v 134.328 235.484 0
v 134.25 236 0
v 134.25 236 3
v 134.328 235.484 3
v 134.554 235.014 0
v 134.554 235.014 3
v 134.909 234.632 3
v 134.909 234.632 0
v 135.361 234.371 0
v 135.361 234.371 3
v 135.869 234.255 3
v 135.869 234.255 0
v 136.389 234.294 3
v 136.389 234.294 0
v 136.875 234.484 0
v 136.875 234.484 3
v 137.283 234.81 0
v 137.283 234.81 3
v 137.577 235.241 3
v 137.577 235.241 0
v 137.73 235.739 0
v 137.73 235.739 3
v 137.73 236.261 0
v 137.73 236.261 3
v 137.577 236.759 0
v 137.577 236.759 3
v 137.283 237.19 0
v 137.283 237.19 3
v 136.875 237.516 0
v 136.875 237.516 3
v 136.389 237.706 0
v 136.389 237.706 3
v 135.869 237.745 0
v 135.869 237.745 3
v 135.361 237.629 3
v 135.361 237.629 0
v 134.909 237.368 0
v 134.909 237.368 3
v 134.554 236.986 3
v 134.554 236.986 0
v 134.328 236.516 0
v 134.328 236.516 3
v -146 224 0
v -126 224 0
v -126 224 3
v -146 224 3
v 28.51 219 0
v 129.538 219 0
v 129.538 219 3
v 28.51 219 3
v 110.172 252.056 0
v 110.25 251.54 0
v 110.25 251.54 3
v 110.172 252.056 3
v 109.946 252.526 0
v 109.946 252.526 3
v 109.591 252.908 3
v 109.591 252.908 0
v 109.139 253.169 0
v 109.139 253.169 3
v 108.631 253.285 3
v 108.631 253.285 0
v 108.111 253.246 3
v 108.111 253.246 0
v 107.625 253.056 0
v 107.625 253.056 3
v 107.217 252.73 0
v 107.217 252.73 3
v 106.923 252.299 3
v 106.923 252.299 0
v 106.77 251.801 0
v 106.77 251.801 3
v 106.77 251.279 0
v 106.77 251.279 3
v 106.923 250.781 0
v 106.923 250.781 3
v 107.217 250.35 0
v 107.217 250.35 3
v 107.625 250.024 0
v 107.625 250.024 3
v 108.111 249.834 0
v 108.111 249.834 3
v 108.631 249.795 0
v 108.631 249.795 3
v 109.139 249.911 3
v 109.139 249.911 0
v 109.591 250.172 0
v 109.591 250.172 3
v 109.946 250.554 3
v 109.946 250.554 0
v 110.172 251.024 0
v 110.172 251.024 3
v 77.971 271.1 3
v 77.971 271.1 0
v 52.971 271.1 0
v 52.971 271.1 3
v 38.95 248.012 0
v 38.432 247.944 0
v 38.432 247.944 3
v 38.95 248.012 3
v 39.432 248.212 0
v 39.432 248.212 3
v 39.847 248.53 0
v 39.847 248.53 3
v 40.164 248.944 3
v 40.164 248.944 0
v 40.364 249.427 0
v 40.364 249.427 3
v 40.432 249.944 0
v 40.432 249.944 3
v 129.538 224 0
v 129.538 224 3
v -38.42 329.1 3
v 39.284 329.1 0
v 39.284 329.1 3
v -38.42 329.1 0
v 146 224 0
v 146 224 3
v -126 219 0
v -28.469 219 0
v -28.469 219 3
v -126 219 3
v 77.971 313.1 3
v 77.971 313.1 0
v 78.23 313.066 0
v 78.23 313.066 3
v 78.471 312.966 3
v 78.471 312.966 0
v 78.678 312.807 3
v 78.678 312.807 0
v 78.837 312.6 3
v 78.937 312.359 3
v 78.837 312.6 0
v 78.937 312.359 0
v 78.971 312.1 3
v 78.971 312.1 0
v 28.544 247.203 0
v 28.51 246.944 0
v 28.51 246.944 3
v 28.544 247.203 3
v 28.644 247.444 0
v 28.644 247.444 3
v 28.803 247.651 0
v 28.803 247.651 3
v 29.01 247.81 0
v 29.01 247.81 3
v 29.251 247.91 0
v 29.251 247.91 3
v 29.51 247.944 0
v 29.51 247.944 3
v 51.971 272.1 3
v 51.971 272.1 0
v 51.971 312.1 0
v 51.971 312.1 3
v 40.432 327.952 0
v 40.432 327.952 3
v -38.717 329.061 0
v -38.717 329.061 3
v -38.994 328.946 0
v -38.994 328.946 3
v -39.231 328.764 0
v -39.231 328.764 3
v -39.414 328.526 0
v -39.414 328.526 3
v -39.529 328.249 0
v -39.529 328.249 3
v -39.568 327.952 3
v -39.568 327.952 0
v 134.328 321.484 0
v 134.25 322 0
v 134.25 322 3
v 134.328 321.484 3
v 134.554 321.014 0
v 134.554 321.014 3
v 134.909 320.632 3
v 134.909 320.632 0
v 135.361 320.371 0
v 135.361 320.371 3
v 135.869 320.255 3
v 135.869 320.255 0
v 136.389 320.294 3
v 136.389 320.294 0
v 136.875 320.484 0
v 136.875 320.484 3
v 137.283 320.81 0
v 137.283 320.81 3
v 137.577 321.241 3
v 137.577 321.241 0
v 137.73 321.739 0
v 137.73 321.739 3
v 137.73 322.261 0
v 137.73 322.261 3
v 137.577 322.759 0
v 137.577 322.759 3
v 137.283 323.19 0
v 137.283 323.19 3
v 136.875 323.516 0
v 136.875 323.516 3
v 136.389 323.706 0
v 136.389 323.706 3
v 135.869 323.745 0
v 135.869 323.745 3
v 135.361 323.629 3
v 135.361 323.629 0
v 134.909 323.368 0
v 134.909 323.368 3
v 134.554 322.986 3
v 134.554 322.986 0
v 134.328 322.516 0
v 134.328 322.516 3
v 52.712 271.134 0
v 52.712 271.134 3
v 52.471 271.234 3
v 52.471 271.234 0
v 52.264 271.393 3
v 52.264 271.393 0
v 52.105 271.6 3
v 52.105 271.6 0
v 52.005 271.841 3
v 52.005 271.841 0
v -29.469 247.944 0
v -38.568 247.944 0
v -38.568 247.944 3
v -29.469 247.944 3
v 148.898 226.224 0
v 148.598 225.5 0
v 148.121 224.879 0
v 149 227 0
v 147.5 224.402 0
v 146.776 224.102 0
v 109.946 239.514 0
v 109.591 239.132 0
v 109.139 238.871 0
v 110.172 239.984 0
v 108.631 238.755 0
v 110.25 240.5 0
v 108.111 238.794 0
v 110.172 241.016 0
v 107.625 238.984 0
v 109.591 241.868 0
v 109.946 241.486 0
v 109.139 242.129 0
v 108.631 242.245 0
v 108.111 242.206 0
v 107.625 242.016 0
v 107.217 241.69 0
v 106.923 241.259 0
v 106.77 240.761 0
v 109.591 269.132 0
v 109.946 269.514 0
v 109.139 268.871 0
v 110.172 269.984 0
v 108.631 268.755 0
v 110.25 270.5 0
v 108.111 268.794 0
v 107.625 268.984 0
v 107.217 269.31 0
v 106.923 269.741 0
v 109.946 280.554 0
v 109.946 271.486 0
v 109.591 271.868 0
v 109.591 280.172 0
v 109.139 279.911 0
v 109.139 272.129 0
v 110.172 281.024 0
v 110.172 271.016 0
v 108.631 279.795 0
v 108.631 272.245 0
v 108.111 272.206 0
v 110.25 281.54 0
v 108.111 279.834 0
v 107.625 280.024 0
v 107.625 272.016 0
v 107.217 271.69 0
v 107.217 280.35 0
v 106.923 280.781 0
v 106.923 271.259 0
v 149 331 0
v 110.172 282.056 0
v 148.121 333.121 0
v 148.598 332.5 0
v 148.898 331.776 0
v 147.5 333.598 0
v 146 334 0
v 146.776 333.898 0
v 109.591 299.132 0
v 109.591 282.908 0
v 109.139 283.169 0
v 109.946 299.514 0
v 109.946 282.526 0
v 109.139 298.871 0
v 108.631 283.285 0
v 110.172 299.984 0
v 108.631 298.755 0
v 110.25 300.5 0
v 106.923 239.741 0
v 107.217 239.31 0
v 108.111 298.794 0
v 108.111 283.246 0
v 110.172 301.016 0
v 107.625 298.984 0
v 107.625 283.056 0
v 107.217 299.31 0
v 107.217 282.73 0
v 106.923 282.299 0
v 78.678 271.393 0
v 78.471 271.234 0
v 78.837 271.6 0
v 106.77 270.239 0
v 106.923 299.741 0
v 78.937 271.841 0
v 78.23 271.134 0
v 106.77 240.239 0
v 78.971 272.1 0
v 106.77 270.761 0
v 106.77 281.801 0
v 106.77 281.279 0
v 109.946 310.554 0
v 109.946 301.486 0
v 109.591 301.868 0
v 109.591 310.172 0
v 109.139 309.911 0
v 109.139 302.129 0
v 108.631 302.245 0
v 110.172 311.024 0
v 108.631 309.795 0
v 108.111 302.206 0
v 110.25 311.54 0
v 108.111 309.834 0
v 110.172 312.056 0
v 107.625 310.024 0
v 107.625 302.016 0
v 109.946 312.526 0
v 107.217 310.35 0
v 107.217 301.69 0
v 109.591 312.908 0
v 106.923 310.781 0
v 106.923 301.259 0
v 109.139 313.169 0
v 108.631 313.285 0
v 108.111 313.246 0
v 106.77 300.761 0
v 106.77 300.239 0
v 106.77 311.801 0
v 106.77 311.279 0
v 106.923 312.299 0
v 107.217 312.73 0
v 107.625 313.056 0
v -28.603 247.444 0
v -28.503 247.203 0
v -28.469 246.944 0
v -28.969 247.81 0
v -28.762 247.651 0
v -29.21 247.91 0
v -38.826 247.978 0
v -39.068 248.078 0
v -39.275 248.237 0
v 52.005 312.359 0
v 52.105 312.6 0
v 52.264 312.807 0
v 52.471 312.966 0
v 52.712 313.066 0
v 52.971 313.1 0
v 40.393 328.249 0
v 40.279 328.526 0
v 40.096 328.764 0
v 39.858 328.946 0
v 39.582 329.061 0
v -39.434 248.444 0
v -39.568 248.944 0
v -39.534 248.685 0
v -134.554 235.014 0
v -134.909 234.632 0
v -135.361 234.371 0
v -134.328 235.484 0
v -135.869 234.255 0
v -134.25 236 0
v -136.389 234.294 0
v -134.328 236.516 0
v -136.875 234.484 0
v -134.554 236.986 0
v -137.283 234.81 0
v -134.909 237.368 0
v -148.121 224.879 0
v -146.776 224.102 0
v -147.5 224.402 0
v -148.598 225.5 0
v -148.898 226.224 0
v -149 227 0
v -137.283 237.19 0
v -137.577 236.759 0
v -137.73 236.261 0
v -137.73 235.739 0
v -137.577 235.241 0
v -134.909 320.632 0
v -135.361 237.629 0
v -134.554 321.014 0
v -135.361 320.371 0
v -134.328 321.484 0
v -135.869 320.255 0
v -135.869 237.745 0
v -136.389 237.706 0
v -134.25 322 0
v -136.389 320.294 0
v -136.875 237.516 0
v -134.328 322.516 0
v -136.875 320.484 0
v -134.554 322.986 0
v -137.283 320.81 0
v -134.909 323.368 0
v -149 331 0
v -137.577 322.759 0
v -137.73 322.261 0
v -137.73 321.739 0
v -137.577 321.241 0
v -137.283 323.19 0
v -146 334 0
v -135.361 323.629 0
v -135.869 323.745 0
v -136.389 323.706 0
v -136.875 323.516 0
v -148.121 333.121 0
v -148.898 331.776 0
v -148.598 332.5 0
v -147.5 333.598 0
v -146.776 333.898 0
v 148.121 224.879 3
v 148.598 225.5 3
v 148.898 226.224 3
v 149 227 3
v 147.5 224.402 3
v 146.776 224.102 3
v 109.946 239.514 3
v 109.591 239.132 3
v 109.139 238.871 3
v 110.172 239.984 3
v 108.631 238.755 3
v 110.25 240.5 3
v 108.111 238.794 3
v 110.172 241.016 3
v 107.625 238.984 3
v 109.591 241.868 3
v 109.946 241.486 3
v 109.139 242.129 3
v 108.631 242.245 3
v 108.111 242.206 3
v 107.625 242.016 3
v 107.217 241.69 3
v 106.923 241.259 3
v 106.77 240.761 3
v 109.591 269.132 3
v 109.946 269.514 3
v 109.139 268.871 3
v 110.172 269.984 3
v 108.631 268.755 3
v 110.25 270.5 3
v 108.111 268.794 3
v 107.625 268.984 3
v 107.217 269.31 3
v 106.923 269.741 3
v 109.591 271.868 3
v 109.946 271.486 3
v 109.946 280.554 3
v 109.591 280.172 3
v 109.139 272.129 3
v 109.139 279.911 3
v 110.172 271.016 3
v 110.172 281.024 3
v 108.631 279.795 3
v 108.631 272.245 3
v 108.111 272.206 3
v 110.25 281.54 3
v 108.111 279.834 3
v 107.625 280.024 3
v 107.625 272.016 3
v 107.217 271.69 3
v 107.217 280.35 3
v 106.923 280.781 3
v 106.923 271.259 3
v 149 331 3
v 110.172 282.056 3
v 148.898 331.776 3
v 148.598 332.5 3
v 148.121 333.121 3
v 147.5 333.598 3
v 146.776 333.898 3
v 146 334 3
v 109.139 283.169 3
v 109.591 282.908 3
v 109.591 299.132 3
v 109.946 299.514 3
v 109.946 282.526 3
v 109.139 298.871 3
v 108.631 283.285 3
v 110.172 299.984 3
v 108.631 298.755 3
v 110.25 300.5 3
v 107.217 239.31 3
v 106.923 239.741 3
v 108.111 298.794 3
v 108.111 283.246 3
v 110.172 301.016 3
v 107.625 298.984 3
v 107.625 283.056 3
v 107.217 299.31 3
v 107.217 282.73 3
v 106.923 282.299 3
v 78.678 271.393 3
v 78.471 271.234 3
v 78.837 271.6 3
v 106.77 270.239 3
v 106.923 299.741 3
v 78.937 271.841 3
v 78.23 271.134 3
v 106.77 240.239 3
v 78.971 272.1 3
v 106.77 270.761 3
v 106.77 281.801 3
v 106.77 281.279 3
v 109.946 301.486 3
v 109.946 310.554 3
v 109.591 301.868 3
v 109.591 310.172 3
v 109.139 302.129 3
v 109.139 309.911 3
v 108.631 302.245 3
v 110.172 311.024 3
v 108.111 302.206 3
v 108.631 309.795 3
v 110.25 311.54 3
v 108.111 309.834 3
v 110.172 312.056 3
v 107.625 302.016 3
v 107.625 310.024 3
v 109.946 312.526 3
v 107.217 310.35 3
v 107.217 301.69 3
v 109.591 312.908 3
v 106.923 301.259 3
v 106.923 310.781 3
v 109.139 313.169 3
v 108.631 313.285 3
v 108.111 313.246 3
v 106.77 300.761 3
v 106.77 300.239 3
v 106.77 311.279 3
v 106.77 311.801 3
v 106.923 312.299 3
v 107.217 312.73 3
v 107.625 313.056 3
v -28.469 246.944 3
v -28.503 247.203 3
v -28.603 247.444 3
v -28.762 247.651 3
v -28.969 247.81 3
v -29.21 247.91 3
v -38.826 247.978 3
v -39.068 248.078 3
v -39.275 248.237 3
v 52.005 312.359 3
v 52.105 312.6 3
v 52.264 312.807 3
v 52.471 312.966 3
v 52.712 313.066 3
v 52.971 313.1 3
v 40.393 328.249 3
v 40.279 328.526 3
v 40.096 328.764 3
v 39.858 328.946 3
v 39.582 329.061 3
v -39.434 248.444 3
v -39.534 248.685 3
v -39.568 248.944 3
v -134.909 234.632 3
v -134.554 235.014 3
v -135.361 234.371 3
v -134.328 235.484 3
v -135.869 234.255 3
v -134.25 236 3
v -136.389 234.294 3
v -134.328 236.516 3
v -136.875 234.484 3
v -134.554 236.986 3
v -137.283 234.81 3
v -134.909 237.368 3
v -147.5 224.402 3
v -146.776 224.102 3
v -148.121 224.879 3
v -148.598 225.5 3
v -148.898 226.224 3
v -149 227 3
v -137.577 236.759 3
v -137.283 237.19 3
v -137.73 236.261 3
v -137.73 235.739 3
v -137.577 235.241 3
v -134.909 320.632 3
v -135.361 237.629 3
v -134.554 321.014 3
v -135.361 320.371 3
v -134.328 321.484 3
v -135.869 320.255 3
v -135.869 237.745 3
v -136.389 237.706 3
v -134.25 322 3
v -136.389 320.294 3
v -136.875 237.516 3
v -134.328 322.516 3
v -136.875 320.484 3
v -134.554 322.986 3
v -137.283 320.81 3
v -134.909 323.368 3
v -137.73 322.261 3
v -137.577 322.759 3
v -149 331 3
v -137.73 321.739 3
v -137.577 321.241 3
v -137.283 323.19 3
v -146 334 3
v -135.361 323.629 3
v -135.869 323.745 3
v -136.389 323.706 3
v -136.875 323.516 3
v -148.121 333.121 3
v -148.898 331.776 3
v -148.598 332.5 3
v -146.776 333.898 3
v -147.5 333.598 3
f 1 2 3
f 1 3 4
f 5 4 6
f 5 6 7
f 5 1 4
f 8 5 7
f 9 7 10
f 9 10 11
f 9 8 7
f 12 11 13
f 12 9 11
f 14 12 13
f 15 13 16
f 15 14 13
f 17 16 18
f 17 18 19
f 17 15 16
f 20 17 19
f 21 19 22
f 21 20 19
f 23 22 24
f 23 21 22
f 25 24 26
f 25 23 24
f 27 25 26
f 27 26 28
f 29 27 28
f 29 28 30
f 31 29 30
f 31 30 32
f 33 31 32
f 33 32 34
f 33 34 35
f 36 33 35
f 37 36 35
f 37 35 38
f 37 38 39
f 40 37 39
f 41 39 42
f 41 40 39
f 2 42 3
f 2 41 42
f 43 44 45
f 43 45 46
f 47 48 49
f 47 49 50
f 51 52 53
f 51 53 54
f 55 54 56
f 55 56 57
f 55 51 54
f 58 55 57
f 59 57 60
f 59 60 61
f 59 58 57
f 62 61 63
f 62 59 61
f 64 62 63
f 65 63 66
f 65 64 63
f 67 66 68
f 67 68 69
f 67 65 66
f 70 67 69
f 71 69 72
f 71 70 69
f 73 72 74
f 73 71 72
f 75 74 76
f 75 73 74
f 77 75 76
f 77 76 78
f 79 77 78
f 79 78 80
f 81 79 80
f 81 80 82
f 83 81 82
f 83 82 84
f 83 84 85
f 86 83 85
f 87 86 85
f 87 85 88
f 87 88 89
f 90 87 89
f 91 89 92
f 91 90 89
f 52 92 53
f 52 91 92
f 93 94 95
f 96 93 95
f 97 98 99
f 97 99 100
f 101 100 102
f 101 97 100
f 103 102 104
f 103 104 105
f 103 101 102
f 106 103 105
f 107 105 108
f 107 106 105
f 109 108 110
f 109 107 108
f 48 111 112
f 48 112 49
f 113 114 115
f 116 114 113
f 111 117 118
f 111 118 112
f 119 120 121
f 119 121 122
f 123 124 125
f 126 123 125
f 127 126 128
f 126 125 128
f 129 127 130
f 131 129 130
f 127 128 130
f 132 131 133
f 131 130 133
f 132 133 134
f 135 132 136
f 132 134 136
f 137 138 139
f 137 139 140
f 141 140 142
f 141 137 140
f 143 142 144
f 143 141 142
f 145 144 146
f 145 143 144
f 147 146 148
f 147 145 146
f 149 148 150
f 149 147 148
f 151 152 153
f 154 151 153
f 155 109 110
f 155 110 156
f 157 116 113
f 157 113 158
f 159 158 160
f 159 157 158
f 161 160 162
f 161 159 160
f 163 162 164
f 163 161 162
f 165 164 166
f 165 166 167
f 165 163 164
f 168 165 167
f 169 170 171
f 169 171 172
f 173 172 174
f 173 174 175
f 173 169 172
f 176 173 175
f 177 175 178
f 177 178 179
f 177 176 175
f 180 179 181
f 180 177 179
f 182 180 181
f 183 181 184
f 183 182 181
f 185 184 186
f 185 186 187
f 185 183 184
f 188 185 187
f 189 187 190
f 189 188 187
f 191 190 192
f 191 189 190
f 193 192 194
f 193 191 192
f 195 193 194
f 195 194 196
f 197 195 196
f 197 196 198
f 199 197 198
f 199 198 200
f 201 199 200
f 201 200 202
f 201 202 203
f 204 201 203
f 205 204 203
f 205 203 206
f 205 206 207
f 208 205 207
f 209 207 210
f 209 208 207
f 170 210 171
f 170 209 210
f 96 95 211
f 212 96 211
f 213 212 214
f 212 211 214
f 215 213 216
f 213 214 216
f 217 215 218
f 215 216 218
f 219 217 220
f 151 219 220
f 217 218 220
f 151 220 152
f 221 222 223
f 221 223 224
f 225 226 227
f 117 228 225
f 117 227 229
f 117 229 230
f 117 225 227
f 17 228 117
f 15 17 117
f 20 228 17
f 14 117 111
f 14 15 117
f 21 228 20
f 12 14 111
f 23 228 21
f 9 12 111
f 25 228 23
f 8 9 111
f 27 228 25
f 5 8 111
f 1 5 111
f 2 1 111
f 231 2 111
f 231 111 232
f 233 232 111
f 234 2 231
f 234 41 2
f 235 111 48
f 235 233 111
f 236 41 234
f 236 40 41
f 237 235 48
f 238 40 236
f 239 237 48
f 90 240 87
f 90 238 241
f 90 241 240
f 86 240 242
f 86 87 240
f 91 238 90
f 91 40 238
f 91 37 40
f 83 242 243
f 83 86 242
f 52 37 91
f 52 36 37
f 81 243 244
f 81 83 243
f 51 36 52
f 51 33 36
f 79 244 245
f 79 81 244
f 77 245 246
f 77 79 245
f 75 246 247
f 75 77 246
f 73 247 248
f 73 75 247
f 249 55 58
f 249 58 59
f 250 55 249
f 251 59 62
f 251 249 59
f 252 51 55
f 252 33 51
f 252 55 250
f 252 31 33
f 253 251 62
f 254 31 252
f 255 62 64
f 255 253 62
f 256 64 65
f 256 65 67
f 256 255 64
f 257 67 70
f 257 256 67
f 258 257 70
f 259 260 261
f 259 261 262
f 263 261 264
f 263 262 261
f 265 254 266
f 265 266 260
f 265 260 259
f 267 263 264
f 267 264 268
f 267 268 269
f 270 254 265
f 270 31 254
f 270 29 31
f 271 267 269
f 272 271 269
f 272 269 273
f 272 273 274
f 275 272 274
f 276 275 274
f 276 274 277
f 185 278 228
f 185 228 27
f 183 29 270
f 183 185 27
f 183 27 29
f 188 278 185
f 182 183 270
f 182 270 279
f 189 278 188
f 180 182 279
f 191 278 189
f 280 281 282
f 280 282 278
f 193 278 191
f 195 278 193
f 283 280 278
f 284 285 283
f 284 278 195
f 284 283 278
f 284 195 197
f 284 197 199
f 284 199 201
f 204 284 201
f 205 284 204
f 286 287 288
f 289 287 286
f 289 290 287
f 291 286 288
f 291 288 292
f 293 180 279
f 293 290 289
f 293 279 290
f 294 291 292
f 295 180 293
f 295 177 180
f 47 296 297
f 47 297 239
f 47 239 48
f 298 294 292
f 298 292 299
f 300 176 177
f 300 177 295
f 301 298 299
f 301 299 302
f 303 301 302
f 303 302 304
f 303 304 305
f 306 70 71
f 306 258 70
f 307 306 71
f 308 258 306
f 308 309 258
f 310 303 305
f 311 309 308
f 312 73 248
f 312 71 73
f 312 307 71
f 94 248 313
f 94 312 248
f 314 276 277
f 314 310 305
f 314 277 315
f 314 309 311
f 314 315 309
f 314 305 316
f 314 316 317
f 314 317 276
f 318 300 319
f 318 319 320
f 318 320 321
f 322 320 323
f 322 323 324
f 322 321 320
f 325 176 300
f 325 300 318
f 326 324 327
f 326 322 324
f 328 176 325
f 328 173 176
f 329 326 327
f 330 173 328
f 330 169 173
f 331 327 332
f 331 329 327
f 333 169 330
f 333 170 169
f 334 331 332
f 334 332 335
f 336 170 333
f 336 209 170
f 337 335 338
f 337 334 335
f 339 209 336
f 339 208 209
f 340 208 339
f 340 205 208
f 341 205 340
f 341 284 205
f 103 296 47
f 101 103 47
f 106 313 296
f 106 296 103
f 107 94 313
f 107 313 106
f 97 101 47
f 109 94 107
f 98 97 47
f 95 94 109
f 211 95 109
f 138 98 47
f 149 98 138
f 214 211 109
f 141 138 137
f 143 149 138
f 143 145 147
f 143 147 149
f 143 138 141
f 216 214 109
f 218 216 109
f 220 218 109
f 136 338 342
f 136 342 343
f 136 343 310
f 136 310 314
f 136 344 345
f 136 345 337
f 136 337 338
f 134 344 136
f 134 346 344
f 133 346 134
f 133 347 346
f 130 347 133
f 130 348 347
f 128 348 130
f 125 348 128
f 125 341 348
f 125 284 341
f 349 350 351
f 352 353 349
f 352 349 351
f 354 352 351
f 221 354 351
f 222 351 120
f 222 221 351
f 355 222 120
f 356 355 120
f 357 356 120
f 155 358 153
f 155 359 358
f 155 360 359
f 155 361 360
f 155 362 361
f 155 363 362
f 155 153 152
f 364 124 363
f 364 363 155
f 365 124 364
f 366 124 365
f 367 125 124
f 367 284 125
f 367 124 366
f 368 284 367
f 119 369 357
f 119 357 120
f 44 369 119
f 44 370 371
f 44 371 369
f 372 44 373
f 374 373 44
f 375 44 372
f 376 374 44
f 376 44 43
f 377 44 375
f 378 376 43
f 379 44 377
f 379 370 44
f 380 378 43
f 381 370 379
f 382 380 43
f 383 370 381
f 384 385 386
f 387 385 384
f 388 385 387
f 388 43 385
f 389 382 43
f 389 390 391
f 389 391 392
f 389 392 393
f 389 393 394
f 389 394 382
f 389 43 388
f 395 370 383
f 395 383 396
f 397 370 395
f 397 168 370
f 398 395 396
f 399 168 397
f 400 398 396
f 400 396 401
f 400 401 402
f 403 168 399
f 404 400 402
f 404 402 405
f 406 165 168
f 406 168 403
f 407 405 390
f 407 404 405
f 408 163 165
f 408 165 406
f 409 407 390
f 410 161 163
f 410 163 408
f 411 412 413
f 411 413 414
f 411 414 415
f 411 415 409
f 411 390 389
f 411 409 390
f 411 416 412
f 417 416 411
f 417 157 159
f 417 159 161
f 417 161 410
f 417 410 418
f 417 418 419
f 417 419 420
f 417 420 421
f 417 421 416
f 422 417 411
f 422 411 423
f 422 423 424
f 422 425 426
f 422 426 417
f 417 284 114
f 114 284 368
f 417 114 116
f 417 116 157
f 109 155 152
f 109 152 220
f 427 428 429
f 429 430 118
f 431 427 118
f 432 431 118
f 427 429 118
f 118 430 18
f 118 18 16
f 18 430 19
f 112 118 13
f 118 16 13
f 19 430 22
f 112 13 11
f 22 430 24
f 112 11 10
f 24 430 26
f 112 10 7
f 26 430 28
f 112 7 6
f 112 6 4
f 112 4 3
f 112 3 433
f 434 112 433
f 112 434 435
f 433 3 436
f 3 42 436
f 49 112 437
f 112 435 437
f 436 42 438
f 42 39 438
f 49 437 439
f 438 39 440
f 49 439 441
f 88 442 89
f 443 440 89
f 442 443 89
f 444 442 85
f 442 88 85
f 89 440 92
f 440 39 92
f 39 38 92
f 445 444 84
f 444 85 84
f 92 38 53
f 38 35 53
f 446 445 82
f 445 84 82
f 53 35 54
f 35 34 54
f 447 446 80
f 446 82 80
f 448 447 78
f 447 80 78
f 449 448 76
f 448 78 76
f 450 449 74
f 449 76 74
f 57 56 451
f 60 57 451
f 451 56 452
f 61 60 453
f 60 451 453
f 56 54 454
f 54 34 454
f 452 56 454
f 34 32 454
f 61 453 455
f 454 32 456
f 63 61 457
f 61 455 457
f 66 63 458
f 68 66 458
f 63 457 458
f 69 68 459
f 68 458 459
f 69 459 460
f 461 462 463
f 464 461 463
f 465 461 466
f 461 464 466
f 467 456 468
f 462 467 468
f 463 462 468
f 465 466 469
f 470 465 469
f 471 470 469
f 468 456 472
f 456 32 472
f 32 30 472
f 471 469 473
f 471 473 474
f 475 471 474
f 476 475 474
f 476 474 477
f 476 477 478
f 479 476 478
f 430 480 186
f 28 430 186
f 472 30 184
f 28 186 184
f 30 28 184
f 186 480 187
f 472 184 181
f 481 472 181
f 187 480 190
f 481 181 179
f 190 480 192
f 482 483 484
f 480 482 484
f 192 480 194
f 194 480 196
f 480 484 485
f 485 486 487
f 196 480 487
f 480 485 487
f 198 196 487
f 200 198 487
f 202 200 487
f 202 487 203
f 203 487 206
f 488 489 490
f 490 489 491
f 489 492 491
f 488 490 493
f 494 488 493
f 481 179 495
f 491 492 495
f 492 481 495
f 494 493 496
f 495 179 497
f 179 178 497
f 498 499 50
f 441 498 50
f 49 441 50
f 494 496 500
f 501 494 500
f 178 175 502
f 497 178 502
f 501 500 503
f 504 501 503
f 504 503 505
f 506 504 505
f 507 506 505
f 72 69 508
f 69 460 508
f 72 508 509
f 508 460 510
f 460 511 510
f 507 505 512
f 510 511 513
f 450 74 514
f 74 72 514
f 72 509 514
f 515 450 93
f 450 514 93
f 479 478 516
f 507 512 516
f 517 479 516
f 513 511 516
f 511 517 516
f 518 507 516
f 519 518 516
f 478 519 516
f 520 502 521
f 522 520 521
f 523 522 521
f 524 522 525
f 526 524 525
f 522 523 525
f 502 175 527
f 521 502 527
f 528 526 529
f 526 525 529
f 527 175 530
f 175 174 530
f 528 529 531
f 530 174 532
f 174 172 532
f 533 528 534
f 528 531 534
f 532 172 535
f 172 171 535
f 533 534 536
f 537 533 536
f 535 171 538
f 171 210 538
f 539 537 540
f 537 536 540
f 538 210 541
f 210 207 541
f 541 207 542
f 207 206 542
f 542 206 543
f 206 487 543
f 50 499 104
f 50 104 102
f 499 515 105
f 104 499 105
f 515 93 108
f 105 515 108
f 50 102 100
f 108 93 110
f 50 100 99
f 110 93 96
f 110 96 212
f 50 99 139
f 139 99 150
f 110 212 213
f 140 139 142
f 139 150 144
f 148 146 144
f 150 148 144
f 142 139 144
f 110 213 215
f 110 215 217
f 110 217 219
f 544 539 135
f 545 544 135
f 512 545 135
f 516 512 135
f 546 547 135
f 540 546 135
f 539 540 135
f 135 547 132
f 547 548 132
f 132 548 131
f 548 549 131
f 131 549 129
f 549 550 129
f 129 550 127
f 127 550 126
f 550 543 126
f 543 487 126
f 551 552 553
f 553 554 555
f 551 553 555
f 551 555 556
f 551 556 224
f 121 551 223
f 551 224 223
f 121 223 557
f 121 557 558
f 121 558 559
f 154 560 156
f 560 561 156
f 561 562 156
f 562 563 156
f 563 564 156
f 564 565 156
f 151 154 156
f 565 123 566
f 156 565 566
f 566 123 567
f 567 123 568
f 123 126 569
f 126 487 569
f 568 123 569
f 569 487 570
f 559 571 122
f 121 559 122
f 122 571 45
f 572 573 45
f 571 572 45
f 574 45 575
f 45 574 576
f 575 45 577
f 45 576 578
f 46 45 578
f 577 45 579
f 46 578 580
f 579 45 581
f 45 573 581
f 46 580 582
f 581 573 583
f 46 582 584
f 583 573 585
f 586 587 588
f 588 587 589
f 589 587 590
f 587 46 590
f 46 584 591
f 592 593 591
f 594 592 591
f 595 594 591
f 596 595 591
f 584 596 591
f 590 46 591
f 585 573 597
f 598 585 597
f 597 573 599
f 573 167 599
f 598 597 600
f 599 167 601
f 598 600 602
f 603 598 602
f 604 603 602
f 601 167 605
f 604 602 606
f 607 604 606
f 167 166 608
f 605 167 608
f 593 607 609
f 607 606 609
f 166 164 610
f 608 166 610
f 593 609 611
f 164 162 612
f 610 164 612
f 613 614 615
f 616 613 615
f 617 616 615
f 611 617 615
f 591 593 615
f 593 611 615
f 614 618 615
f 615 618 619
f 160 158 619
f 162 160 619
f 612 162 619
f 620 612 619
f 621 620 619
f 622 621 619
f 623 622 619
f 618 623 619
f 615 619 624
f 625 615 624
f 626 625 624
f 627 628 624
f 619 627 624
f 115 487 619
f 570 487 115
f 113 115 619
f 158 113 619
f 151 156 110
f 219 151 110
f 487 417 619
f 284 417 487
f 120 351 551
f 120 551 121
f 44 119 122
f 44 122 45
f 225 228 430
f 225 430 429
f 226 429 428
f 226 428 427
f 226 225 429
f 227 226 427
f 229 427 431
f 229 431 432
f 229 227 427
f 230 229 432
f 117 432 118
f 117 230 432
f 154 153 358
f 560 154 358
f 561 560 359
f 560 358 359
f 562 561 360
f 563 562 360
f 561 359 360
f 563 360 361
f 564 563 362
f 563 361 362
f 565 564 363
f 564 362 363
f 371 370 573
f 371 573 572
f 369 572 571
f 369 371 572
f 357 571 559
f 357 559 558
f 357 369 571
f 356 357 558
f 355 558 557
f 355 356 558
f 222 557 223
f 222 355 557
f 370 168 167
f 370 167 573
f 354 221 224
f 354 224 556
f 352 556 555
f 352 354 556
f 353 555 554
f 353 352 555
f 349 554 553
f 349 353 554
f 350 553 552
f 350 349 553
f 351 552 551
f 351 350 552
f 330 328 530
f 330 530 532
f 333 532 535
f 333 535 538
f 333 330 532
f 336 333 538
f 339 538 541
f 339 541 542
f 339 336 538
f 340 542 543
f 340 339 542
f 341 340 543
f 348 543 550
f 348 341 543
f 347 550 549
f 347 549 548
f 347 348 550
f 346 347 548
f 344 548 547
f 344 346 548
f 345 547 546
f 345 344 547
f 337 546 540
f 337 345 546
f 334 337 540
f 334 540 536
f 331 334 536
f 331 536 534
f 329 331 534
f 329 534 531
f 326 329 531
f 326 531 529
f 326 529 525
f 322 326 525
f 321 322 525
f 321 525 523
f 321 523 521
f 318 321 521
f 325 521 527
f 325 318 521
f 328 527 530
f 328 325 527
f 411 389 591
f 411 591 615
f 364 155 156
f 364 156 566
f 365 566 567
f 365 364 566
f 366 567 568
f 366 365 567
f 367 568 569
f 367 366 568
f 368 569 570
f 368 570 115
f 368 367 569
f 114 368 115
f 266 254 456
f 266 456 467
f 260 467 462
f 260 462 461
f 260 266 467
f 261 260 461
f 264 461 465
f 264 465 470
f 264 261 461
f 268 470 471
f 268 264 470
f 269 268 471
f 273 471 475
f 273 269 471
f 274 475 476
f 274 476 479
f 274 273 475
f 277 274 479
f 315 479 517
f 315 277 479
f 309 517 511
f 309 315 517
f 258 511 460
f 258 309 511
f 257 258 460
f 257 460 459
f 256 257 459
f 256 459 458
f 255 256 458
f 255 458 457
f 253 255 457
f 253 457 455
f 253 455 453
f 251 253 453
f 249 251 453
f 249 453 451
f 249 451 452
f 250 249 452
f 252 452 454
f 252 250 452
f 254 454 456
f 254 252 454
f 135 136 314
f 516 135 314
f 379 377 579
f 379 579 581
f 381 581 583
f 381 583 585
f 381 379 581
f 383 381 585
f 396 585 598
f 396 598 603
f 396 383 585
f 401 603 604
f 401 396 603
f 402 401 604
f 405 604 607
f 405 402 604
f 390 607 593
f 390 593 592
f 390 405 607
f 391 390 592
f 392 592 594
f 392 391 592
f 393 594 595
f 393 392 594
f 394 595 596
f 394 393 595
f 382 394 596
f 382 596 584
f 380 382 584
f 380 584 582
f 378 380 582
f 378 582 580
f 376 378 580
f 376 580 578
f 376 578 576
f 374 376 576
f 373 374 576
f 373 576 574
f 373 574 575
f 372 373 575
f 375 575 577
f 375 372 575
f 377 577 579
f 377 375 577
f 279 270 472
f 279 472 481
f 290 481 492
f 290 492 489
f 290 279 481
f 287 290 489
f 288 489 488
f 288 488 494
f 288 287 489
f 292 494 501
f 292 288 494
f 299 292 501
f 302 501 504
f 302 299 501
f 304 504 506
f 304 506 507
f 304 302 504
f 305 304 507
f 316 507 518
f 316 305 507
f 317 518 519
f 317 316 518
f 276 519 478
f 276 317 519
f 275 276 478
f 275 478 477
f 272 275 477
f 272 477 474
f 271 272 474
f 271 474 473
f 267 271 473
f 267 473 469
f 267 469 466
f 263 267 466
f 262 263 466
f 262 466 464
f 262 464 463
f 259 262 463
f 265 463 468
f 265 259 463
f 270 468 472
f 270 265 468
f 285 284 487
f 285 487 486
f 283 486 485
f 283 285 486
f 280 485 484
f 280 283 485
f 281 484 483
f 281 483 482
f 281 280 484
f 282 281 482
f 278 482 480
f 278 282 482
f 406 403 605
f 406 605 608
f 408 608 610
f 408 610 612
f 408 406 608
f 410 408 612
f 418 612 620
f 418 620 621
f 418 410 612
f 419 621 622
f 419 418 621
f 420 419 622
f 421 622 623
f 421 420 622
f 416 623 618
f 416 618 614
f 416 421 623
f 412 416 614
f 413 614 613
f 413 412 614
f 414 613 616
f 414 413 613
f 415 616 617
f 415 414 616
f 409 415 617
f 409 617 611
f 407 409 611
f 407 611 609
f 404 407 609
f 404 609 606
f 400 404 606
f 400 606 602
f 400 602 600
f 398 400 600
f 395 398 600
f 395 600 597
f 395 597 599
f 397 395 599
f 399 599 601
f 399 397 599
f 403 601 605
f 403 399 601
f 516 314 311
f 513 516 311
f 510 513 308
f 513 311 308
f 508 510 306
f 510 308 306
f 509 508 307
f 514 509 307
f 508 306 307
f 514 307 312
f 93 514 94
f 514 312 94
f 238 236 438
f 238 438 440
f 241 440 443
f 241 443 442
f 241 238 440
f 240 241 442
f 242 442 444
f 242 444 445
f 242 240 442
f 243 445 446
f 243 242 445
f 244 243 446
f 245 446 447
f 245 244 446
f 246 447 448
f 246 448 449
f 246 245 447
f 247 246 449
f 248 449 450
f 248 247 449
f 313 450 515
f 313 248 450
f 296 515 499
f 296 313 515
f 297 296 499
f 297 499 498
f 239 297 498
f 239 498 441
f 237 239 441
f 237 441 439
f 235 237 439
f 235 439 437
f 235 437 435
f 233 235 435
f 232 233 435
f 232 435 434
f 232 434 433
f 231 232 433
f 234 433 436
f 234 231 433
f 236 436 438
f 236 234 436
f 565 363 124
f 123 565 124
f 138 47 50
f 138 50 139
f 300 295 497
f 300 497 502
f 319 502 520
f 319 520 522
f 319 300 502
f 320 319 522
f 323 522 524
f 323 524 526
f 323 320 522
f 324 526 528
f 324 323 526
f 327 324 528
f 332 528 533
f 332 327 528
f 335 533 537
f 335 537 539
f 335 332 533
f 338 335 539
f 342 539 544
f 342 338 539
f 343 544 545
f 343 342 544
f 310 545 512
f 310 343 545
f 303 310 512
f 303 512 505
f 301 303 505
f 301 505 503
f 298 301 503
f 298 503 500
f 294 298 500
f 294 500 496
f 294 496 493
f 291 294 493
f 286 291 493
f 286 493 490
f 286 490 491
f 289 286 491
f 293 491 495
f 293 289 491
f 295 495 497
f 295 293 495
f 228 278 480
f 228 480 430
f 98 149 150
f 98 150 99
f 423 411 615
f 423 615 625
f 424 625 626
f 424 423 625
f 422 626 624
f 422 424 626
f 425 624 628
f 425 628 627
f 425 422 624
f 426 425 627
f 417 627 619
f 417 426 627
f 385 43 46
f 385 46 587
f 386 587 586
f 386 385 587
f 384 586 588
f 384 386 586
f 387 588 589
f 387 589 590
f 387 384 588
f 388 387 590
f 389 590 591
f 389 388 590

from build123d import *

# Parameters (mm, degrees)
SKETCH1_R           = 1.75
BOSS_EXTRUDE1_DEPTH = 3


with BuildPart() as part:
    # Sketch1 → Boss-Extrude1 (new body)
    with BuildSketch(Plane.XY):
        with BuildLine():
            Line((-146, 333.999999944), (146, 333.999999944))
            ThreePointArc((146, 333.999999944), (148.121320344, 333.121320287), (149, 330.999999944))
            Line((149, 330.999999944), (149, 226.999999944))
            ThreePointArc((149, 226.999999944), (148.121320344, 224.8786796), (146, 223.999999944))
            Line((146, 223.999999944), (129.53838912, 223.999999944))
            Line((129.53838912, 223.999999944), (129.53838912, 219))
            Line((129.53838912, 219), (73.53838912, 219))
            Line((73.53838912, 219), (28.510237275, 219))
            Line((28.510237275, 219), (28.510237275, 246.944274273))
            ThreePointArc((28.510237275, 246.944274273), (28.803130494, 247.651381054), (29.510237275, 247.944274273))
            Line((29.510237275, 247.944274273), (38.432325919, 247.944274273))
            ThreePointArc((38.432325919, 247.944274273), (39.846539481, 248.530060711), (40.432325919, 249.944274273))
            Line((40.432325919, 249.944274273), (40.432325919, 327.952168393))
            ThreePointArc((40.432325919, 327.952168393), (40.096133825, 328.763807906), (39.284494312, 329.1))
            Line((39.284494312, 329.1), (-38.419842474, 329.1))
            ThreePointArc((-38.419842474, 329.1), (-39.231481987, 328.763807906), (-39.567674081, 327.952168393))
            Line((-39.567674081, 327.952168393), (-39.567674081, 248.944274273))
            ThreePointArc((-39.567674081, 248.944274273), (-39.274780862, 248.237167492), (-38.567674081, 247.944274273))
            Line((-38.567674081, 247.944274273), (-29.469288178, 247.944274273))
            ThreePointArc((-29.469288178, 247.944274273), (-28.762181396, 247.651381054), (-28.469288178, 246.944274273))
            Line((-28.469288178, 246.944274273), (-28.469288178, 218.999999943))
            Line((-28.469288178, 218.999999943), (-70, 218.999999943))
            Line((-70, 218.999999943), (-126, 218.999999943))
            Line((-126, 218.999999943), (-126, 223.999999944))
            Line((-126, 223.999999944), (-146, 223.999999944))
            ThreePointArc((-146, 223.999999944), (-148.121320343, 224.8786796), (-149, 226.999999944))
            Line((-149, 226.999999944), (-149, 330.999999944))
            ThreePointArc((-149, 330.999999944), (-148.121320343, 333.121320287), (-146, 333.999999944))
        make_face()
        with Locations((-136, 321.999999944)):
            Circle(SKETCH1_R, mode=Mode.SUBTRACT)
        with Locations((-136, 235.999999944)):
            Circle(SKETCH1_R, mode=Mode.SUBTRACT)
        with Locations(Location((136, 235.999999944, 0), (0, 0, 180))):
            Circle(SKETCH1_R, mode=Mode.SUBTRACT)
        with Locations(Location((136, 321.999999944, 0), (0, 0, 180))):
            Circle(SKETCH1_R, mode=Mode.SUBTRACT)
        with Locations((108.5, 311.539999944)):
            Circle(SKETCH1_R, mode=Mode.SUBTRACT)
        with Locations((108.5, 300.499999944)):
            Circle(SKETCH1_R, mode=Mode.SUBTRACT)
        with Locations((108.5, 281.539999944)):
            Circle(SKETCH1_R, mode=Mode.SUBTRACT)
        with Locations((108.5, 270.499999944)):
            Circle(SKETCH1_R, mode=Mode.SUBTRACT)
        with Locations((108.5, 251.539999944)):
            Circle(SKETCH1_R, mode=Mode.SUBTRACT)
        with Locations((108.5, 240.499999944)):
            Circle(SKETCH1_R, mode=Mode.SUBTRACT)
        with BuildLine():
            Line((52.97092131, 313.1), (77.97092131, 313.1))
            ThreePointArc((77.97092131, 313.1), (78.678028091, 312.807106781), (78.97092131, 312.1))
            Line((78.97092131, 312.1), (78.97092131, 272.1))
            ThreePointArc((78.97092131, 272.1), (78.678028091, 271.392893219), (77.97092131, 271.1))
            Line((77.97092131, 271.1), (52.97092131, 271.1))
            ThreePointArc((52.97092131, 271.1), (52.263814529, 271.392893219), (51.97092131, 272.1))
            Line((51.97092131, 272.1), (51.97092131, 312.1))
            ThreePointArc((51.97092131, 312.1), (52.263814529, 312.807106781), (52.97092131, 313.1))
        make_face(mode=Mode.SUBTRACT)
    extrude(amount=BOSS_EXTRUDE1_DEPTH)


solid = part.part
